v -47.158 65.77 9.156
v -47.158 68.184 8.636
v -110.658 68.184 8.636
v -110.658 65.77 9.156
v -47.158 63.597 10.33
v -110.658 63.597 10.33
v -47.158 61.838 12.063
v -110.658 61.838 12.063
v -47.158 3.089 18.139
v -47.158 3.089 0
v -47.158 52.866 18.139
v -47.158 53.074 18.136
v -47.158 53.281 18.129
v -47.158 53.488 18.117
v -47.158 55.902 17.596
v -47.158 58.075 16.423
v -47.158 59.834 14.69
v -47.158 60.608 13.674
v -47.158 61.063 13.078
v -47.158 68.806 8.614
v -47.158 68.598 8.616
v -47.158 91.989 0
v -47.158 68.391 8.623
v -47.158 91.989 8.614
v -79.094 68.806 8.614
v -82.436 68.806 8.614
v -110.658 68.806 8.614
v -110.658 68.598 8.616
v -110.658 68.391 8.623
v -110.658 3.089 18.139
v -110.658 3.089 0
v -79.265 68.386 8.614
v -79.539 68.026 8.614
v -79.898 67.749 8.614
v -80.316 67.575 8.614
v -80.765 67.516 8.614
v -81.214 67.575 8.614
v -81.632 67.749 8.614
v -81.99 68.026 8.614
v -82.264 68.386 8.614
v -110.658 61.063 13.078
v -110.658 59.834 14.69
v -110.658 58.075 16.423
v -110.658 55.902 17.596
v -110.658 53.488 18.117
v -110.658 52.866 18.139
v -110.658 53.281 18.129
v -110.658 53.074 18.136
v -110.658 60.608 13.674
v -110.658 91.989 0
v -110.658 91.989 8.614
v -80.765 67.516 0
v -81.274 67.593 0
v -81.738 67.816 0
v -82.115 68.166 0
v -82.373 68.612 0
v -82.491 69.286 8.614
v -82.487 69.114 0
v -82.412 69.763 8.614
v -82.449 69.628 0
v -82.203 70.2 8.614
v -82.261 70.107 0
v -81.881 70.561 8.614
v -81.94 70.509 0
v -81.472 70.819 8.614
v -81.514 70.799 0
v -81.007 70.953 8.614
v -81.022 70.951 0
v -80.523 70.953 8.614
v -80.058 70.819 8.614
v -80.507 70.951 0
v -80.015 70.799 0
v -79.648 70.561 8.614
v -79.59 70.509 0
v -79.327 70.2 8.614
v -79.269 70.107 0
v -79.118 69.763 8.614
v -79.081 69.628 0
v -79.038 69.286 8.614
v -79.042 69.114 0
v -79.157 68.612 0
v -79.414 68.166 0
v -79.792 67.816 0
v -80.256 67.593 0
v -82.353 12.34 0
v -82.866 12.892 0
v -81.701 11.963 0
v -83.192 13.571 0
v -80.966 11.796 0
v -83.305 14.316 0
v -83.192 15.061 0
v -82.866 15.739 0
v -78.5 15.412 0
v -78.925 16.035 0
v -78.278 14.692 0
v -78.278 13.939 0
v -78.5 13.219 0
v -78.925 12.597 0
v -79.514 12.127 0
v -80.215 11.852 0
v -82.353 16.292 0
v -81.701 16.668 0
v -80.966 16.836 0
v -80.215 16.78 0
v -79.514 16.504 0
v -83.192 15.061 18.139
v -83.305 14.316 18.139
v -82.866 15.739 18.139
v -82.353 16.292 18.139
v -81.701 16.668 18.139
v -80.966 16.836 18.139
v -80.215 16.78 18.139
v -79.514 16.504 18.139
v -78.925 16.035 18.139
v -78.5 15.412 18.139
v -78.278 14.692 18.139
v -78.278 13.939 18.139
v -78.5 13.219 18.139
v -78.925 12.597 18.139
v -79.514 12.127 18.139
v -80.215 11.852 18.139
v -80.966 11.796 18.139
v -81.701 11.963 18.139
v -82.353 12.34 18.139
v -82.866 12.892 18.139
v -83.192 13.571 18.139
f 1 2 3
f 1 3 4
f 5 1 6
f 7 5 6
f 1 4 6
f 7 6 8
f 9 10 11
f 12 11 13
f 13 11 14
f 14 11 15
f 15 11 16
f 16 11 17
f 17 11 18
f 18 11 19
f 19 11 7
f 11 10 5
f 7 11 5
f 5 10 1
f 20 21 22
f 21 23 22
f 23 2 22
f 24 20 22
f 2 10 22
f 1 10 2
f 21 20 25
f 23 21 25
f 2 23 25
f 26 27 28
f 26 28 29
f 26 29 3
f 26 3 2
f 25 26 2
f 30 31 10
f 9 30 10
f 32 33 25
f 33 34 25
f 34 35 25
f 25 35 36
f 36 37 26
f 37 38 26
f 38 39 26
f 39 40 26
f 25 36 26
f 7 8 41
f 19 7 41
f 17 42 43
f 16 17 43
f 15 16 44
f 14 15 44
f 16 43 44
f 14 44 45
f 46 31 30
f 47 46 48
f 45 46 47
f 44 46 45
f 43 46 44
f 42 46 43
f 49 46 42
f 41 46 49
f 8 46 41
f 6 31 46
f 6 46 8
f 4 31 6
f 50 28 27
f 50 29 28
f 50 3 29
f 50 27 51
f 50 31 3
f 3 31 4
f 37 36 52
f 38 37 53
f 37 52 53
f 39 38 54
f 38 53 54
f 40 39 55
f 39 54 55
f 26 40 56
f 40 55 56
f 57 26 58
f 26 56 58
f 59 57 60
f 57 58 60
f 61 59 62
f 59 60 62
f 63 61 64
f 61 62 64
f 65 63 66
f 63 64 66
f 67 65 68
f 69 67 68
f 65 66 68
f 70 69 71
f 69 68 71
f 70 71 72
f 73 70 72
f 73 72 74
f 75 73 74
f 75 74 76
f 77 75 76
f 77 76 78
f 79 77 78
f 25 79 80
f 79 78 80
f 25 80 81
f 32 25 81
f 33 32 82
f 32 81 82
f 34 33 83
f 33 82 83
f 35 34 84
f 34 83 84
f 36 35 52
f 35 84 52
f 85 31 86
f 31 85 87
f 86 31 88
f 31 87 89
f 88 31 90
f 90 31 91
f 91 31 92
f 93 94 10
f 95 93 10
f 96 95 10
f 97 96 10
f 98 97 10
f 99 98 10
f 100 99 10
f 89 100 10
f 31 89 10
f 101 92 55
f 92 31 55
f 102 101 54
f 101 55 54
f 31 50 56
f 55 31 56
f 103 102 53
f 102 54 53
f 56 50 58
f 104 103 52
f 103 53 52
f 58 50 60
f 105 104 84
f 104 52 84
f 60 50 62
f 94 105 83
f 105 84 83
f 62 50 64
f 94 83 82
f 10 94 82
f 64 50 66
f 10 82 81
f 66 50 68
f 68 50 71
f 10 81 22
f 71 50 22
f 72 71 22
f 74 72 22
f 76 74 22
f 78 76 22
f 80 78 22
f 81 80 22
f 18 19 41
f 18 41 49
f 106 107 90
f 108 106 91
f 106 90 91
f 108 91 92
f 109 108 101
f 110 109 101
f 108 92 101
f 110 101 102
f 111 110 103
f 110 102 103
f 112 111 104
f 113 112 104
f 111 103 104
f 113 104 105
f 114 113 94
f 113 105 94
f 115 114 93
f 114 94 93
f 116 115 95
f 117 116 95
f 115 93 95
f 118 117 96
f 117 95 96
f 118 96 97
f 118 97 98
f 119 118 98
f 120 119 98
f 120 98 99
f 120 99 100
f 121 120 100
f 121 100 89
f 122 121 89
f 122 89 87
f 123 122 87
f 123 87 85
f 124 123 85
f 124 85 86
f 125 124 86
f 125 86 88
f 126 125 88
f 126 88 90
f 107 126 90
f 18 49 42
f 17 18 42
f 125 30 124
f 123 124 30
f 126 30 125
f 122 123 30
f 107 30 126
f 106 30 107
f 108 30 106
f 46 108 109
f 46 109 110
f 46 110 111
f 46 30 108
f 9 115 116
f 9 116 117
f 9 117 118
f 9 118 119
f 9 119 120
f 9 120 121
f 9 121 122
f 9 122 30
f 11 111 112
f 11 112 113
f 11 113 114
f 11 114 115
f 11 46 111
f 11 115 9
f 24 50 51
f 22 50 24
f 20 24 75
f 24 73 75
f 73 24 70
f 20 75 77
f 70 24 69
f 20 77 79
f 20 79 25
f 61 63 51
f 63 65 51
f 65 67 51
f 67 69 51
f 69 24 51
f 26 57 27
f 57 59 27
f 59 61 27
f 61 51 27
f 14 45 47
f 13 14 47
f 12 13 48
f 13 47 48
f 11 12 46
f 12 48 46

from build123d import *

# Parameters (mm, degrees)
SKETCH1_W                  = 63.5
SKETCH1_H                  = 88.9
BOSS_EXTRUDE1_DEPTH        = 18.13868
CUT_EXTRUDE1_DEPTH         = 63.5
SKETCH5_W                  = 1.7272
SKETCH5_H                  = 8.613680223
F_8_0_199_DIAMETER_HOLE1_D = 5.0546


with BuildPart() as part:
    # Sketch1 → Boss-Extrude1 (new body)
    with BuildSketch(Plane.XY):
        with Locations((-78.907526017, 47.538989794)):
            Rectangle(SKETCH1_W, SKETCH1_H)
    extrude(amount=BOSS_EXTRUDE1_DEPTH)

    # Sketch2 → Cut-Extrude1 (cut)
    with BuildSketch(Plane.ZY.offset(110.657526017)):
        with BuildLine():
            Line((8.613680223, 91.988989794), (8.613680223, 74.018491939))
            Line((8.613680223, 74.018491939), (8.613680223, 69.243291939))
            Line((8.613680223, 69.243291939), (8.613680223, 68.805550488))
            ThreePointArc((8.613680223, 68.805550488), (8.619201776, 68.494519524), (8.635759479, 68.183880521))
            ThreePointArc((8.635759479, 68.183880521), (9.666013904, 64.641922993), (12.0625652, 61.83774233))
            Line((12.0625652, 61.83774233), (13.078006955, 61.063298751))
            Line((13.078006955, 61.063298751), (13.67435349, 60.608485127))
            Line((13.67435349, 60.608485127), (14.689795245, 59.834041549))
            ThreePointArc((14.689795245, 59.834041549), (17.086346542, 57.029860886), (18.116600967, 53.487903358))
            ThreePointArc((18.116600967, 53.487903358), (18.133158669, 53.177264354), (18.138680223, 52.866233391))
            Line((18.138680223, 52.866233391), (18.138680223, 91.988989794))
            Line((18.138680223, 91.988989794), (8.613680223, 91.988989794))
        make_face()
    extrude(amount=-CUT_EXTRUDE1_DEPTH, mode=Mode.SUBTRACT)

    # Sketch5 → #29 (0.136) Diameter Hole1 (revolve, cut)
    with BuildSketch(Plane(origin=(-80.764740239, 69.243291939, 8.613680223), x_dir=(0, -1, 0), z_dir=(1, 0, 0))):
        with Locations((0.8636, 4.306840112)):
            Rectangle(SKETCH5_W, SKETCH5_H)
    revolve(axis=Axis((-80.764740239, 69.243291939, 14.963680223), (0, 0, -1)), mode=Mode.SUBTRACT)

    # #8 (0.199) Diameter Hole1 (through all)
    with Locations(Plane.XY.offset(18.138680223)):
        with Locations((-80.777440239, 14.315791939)):
            Hole(F_8_0_199_DIAMETER_HOLE1_D / 2)


solid = part.part
